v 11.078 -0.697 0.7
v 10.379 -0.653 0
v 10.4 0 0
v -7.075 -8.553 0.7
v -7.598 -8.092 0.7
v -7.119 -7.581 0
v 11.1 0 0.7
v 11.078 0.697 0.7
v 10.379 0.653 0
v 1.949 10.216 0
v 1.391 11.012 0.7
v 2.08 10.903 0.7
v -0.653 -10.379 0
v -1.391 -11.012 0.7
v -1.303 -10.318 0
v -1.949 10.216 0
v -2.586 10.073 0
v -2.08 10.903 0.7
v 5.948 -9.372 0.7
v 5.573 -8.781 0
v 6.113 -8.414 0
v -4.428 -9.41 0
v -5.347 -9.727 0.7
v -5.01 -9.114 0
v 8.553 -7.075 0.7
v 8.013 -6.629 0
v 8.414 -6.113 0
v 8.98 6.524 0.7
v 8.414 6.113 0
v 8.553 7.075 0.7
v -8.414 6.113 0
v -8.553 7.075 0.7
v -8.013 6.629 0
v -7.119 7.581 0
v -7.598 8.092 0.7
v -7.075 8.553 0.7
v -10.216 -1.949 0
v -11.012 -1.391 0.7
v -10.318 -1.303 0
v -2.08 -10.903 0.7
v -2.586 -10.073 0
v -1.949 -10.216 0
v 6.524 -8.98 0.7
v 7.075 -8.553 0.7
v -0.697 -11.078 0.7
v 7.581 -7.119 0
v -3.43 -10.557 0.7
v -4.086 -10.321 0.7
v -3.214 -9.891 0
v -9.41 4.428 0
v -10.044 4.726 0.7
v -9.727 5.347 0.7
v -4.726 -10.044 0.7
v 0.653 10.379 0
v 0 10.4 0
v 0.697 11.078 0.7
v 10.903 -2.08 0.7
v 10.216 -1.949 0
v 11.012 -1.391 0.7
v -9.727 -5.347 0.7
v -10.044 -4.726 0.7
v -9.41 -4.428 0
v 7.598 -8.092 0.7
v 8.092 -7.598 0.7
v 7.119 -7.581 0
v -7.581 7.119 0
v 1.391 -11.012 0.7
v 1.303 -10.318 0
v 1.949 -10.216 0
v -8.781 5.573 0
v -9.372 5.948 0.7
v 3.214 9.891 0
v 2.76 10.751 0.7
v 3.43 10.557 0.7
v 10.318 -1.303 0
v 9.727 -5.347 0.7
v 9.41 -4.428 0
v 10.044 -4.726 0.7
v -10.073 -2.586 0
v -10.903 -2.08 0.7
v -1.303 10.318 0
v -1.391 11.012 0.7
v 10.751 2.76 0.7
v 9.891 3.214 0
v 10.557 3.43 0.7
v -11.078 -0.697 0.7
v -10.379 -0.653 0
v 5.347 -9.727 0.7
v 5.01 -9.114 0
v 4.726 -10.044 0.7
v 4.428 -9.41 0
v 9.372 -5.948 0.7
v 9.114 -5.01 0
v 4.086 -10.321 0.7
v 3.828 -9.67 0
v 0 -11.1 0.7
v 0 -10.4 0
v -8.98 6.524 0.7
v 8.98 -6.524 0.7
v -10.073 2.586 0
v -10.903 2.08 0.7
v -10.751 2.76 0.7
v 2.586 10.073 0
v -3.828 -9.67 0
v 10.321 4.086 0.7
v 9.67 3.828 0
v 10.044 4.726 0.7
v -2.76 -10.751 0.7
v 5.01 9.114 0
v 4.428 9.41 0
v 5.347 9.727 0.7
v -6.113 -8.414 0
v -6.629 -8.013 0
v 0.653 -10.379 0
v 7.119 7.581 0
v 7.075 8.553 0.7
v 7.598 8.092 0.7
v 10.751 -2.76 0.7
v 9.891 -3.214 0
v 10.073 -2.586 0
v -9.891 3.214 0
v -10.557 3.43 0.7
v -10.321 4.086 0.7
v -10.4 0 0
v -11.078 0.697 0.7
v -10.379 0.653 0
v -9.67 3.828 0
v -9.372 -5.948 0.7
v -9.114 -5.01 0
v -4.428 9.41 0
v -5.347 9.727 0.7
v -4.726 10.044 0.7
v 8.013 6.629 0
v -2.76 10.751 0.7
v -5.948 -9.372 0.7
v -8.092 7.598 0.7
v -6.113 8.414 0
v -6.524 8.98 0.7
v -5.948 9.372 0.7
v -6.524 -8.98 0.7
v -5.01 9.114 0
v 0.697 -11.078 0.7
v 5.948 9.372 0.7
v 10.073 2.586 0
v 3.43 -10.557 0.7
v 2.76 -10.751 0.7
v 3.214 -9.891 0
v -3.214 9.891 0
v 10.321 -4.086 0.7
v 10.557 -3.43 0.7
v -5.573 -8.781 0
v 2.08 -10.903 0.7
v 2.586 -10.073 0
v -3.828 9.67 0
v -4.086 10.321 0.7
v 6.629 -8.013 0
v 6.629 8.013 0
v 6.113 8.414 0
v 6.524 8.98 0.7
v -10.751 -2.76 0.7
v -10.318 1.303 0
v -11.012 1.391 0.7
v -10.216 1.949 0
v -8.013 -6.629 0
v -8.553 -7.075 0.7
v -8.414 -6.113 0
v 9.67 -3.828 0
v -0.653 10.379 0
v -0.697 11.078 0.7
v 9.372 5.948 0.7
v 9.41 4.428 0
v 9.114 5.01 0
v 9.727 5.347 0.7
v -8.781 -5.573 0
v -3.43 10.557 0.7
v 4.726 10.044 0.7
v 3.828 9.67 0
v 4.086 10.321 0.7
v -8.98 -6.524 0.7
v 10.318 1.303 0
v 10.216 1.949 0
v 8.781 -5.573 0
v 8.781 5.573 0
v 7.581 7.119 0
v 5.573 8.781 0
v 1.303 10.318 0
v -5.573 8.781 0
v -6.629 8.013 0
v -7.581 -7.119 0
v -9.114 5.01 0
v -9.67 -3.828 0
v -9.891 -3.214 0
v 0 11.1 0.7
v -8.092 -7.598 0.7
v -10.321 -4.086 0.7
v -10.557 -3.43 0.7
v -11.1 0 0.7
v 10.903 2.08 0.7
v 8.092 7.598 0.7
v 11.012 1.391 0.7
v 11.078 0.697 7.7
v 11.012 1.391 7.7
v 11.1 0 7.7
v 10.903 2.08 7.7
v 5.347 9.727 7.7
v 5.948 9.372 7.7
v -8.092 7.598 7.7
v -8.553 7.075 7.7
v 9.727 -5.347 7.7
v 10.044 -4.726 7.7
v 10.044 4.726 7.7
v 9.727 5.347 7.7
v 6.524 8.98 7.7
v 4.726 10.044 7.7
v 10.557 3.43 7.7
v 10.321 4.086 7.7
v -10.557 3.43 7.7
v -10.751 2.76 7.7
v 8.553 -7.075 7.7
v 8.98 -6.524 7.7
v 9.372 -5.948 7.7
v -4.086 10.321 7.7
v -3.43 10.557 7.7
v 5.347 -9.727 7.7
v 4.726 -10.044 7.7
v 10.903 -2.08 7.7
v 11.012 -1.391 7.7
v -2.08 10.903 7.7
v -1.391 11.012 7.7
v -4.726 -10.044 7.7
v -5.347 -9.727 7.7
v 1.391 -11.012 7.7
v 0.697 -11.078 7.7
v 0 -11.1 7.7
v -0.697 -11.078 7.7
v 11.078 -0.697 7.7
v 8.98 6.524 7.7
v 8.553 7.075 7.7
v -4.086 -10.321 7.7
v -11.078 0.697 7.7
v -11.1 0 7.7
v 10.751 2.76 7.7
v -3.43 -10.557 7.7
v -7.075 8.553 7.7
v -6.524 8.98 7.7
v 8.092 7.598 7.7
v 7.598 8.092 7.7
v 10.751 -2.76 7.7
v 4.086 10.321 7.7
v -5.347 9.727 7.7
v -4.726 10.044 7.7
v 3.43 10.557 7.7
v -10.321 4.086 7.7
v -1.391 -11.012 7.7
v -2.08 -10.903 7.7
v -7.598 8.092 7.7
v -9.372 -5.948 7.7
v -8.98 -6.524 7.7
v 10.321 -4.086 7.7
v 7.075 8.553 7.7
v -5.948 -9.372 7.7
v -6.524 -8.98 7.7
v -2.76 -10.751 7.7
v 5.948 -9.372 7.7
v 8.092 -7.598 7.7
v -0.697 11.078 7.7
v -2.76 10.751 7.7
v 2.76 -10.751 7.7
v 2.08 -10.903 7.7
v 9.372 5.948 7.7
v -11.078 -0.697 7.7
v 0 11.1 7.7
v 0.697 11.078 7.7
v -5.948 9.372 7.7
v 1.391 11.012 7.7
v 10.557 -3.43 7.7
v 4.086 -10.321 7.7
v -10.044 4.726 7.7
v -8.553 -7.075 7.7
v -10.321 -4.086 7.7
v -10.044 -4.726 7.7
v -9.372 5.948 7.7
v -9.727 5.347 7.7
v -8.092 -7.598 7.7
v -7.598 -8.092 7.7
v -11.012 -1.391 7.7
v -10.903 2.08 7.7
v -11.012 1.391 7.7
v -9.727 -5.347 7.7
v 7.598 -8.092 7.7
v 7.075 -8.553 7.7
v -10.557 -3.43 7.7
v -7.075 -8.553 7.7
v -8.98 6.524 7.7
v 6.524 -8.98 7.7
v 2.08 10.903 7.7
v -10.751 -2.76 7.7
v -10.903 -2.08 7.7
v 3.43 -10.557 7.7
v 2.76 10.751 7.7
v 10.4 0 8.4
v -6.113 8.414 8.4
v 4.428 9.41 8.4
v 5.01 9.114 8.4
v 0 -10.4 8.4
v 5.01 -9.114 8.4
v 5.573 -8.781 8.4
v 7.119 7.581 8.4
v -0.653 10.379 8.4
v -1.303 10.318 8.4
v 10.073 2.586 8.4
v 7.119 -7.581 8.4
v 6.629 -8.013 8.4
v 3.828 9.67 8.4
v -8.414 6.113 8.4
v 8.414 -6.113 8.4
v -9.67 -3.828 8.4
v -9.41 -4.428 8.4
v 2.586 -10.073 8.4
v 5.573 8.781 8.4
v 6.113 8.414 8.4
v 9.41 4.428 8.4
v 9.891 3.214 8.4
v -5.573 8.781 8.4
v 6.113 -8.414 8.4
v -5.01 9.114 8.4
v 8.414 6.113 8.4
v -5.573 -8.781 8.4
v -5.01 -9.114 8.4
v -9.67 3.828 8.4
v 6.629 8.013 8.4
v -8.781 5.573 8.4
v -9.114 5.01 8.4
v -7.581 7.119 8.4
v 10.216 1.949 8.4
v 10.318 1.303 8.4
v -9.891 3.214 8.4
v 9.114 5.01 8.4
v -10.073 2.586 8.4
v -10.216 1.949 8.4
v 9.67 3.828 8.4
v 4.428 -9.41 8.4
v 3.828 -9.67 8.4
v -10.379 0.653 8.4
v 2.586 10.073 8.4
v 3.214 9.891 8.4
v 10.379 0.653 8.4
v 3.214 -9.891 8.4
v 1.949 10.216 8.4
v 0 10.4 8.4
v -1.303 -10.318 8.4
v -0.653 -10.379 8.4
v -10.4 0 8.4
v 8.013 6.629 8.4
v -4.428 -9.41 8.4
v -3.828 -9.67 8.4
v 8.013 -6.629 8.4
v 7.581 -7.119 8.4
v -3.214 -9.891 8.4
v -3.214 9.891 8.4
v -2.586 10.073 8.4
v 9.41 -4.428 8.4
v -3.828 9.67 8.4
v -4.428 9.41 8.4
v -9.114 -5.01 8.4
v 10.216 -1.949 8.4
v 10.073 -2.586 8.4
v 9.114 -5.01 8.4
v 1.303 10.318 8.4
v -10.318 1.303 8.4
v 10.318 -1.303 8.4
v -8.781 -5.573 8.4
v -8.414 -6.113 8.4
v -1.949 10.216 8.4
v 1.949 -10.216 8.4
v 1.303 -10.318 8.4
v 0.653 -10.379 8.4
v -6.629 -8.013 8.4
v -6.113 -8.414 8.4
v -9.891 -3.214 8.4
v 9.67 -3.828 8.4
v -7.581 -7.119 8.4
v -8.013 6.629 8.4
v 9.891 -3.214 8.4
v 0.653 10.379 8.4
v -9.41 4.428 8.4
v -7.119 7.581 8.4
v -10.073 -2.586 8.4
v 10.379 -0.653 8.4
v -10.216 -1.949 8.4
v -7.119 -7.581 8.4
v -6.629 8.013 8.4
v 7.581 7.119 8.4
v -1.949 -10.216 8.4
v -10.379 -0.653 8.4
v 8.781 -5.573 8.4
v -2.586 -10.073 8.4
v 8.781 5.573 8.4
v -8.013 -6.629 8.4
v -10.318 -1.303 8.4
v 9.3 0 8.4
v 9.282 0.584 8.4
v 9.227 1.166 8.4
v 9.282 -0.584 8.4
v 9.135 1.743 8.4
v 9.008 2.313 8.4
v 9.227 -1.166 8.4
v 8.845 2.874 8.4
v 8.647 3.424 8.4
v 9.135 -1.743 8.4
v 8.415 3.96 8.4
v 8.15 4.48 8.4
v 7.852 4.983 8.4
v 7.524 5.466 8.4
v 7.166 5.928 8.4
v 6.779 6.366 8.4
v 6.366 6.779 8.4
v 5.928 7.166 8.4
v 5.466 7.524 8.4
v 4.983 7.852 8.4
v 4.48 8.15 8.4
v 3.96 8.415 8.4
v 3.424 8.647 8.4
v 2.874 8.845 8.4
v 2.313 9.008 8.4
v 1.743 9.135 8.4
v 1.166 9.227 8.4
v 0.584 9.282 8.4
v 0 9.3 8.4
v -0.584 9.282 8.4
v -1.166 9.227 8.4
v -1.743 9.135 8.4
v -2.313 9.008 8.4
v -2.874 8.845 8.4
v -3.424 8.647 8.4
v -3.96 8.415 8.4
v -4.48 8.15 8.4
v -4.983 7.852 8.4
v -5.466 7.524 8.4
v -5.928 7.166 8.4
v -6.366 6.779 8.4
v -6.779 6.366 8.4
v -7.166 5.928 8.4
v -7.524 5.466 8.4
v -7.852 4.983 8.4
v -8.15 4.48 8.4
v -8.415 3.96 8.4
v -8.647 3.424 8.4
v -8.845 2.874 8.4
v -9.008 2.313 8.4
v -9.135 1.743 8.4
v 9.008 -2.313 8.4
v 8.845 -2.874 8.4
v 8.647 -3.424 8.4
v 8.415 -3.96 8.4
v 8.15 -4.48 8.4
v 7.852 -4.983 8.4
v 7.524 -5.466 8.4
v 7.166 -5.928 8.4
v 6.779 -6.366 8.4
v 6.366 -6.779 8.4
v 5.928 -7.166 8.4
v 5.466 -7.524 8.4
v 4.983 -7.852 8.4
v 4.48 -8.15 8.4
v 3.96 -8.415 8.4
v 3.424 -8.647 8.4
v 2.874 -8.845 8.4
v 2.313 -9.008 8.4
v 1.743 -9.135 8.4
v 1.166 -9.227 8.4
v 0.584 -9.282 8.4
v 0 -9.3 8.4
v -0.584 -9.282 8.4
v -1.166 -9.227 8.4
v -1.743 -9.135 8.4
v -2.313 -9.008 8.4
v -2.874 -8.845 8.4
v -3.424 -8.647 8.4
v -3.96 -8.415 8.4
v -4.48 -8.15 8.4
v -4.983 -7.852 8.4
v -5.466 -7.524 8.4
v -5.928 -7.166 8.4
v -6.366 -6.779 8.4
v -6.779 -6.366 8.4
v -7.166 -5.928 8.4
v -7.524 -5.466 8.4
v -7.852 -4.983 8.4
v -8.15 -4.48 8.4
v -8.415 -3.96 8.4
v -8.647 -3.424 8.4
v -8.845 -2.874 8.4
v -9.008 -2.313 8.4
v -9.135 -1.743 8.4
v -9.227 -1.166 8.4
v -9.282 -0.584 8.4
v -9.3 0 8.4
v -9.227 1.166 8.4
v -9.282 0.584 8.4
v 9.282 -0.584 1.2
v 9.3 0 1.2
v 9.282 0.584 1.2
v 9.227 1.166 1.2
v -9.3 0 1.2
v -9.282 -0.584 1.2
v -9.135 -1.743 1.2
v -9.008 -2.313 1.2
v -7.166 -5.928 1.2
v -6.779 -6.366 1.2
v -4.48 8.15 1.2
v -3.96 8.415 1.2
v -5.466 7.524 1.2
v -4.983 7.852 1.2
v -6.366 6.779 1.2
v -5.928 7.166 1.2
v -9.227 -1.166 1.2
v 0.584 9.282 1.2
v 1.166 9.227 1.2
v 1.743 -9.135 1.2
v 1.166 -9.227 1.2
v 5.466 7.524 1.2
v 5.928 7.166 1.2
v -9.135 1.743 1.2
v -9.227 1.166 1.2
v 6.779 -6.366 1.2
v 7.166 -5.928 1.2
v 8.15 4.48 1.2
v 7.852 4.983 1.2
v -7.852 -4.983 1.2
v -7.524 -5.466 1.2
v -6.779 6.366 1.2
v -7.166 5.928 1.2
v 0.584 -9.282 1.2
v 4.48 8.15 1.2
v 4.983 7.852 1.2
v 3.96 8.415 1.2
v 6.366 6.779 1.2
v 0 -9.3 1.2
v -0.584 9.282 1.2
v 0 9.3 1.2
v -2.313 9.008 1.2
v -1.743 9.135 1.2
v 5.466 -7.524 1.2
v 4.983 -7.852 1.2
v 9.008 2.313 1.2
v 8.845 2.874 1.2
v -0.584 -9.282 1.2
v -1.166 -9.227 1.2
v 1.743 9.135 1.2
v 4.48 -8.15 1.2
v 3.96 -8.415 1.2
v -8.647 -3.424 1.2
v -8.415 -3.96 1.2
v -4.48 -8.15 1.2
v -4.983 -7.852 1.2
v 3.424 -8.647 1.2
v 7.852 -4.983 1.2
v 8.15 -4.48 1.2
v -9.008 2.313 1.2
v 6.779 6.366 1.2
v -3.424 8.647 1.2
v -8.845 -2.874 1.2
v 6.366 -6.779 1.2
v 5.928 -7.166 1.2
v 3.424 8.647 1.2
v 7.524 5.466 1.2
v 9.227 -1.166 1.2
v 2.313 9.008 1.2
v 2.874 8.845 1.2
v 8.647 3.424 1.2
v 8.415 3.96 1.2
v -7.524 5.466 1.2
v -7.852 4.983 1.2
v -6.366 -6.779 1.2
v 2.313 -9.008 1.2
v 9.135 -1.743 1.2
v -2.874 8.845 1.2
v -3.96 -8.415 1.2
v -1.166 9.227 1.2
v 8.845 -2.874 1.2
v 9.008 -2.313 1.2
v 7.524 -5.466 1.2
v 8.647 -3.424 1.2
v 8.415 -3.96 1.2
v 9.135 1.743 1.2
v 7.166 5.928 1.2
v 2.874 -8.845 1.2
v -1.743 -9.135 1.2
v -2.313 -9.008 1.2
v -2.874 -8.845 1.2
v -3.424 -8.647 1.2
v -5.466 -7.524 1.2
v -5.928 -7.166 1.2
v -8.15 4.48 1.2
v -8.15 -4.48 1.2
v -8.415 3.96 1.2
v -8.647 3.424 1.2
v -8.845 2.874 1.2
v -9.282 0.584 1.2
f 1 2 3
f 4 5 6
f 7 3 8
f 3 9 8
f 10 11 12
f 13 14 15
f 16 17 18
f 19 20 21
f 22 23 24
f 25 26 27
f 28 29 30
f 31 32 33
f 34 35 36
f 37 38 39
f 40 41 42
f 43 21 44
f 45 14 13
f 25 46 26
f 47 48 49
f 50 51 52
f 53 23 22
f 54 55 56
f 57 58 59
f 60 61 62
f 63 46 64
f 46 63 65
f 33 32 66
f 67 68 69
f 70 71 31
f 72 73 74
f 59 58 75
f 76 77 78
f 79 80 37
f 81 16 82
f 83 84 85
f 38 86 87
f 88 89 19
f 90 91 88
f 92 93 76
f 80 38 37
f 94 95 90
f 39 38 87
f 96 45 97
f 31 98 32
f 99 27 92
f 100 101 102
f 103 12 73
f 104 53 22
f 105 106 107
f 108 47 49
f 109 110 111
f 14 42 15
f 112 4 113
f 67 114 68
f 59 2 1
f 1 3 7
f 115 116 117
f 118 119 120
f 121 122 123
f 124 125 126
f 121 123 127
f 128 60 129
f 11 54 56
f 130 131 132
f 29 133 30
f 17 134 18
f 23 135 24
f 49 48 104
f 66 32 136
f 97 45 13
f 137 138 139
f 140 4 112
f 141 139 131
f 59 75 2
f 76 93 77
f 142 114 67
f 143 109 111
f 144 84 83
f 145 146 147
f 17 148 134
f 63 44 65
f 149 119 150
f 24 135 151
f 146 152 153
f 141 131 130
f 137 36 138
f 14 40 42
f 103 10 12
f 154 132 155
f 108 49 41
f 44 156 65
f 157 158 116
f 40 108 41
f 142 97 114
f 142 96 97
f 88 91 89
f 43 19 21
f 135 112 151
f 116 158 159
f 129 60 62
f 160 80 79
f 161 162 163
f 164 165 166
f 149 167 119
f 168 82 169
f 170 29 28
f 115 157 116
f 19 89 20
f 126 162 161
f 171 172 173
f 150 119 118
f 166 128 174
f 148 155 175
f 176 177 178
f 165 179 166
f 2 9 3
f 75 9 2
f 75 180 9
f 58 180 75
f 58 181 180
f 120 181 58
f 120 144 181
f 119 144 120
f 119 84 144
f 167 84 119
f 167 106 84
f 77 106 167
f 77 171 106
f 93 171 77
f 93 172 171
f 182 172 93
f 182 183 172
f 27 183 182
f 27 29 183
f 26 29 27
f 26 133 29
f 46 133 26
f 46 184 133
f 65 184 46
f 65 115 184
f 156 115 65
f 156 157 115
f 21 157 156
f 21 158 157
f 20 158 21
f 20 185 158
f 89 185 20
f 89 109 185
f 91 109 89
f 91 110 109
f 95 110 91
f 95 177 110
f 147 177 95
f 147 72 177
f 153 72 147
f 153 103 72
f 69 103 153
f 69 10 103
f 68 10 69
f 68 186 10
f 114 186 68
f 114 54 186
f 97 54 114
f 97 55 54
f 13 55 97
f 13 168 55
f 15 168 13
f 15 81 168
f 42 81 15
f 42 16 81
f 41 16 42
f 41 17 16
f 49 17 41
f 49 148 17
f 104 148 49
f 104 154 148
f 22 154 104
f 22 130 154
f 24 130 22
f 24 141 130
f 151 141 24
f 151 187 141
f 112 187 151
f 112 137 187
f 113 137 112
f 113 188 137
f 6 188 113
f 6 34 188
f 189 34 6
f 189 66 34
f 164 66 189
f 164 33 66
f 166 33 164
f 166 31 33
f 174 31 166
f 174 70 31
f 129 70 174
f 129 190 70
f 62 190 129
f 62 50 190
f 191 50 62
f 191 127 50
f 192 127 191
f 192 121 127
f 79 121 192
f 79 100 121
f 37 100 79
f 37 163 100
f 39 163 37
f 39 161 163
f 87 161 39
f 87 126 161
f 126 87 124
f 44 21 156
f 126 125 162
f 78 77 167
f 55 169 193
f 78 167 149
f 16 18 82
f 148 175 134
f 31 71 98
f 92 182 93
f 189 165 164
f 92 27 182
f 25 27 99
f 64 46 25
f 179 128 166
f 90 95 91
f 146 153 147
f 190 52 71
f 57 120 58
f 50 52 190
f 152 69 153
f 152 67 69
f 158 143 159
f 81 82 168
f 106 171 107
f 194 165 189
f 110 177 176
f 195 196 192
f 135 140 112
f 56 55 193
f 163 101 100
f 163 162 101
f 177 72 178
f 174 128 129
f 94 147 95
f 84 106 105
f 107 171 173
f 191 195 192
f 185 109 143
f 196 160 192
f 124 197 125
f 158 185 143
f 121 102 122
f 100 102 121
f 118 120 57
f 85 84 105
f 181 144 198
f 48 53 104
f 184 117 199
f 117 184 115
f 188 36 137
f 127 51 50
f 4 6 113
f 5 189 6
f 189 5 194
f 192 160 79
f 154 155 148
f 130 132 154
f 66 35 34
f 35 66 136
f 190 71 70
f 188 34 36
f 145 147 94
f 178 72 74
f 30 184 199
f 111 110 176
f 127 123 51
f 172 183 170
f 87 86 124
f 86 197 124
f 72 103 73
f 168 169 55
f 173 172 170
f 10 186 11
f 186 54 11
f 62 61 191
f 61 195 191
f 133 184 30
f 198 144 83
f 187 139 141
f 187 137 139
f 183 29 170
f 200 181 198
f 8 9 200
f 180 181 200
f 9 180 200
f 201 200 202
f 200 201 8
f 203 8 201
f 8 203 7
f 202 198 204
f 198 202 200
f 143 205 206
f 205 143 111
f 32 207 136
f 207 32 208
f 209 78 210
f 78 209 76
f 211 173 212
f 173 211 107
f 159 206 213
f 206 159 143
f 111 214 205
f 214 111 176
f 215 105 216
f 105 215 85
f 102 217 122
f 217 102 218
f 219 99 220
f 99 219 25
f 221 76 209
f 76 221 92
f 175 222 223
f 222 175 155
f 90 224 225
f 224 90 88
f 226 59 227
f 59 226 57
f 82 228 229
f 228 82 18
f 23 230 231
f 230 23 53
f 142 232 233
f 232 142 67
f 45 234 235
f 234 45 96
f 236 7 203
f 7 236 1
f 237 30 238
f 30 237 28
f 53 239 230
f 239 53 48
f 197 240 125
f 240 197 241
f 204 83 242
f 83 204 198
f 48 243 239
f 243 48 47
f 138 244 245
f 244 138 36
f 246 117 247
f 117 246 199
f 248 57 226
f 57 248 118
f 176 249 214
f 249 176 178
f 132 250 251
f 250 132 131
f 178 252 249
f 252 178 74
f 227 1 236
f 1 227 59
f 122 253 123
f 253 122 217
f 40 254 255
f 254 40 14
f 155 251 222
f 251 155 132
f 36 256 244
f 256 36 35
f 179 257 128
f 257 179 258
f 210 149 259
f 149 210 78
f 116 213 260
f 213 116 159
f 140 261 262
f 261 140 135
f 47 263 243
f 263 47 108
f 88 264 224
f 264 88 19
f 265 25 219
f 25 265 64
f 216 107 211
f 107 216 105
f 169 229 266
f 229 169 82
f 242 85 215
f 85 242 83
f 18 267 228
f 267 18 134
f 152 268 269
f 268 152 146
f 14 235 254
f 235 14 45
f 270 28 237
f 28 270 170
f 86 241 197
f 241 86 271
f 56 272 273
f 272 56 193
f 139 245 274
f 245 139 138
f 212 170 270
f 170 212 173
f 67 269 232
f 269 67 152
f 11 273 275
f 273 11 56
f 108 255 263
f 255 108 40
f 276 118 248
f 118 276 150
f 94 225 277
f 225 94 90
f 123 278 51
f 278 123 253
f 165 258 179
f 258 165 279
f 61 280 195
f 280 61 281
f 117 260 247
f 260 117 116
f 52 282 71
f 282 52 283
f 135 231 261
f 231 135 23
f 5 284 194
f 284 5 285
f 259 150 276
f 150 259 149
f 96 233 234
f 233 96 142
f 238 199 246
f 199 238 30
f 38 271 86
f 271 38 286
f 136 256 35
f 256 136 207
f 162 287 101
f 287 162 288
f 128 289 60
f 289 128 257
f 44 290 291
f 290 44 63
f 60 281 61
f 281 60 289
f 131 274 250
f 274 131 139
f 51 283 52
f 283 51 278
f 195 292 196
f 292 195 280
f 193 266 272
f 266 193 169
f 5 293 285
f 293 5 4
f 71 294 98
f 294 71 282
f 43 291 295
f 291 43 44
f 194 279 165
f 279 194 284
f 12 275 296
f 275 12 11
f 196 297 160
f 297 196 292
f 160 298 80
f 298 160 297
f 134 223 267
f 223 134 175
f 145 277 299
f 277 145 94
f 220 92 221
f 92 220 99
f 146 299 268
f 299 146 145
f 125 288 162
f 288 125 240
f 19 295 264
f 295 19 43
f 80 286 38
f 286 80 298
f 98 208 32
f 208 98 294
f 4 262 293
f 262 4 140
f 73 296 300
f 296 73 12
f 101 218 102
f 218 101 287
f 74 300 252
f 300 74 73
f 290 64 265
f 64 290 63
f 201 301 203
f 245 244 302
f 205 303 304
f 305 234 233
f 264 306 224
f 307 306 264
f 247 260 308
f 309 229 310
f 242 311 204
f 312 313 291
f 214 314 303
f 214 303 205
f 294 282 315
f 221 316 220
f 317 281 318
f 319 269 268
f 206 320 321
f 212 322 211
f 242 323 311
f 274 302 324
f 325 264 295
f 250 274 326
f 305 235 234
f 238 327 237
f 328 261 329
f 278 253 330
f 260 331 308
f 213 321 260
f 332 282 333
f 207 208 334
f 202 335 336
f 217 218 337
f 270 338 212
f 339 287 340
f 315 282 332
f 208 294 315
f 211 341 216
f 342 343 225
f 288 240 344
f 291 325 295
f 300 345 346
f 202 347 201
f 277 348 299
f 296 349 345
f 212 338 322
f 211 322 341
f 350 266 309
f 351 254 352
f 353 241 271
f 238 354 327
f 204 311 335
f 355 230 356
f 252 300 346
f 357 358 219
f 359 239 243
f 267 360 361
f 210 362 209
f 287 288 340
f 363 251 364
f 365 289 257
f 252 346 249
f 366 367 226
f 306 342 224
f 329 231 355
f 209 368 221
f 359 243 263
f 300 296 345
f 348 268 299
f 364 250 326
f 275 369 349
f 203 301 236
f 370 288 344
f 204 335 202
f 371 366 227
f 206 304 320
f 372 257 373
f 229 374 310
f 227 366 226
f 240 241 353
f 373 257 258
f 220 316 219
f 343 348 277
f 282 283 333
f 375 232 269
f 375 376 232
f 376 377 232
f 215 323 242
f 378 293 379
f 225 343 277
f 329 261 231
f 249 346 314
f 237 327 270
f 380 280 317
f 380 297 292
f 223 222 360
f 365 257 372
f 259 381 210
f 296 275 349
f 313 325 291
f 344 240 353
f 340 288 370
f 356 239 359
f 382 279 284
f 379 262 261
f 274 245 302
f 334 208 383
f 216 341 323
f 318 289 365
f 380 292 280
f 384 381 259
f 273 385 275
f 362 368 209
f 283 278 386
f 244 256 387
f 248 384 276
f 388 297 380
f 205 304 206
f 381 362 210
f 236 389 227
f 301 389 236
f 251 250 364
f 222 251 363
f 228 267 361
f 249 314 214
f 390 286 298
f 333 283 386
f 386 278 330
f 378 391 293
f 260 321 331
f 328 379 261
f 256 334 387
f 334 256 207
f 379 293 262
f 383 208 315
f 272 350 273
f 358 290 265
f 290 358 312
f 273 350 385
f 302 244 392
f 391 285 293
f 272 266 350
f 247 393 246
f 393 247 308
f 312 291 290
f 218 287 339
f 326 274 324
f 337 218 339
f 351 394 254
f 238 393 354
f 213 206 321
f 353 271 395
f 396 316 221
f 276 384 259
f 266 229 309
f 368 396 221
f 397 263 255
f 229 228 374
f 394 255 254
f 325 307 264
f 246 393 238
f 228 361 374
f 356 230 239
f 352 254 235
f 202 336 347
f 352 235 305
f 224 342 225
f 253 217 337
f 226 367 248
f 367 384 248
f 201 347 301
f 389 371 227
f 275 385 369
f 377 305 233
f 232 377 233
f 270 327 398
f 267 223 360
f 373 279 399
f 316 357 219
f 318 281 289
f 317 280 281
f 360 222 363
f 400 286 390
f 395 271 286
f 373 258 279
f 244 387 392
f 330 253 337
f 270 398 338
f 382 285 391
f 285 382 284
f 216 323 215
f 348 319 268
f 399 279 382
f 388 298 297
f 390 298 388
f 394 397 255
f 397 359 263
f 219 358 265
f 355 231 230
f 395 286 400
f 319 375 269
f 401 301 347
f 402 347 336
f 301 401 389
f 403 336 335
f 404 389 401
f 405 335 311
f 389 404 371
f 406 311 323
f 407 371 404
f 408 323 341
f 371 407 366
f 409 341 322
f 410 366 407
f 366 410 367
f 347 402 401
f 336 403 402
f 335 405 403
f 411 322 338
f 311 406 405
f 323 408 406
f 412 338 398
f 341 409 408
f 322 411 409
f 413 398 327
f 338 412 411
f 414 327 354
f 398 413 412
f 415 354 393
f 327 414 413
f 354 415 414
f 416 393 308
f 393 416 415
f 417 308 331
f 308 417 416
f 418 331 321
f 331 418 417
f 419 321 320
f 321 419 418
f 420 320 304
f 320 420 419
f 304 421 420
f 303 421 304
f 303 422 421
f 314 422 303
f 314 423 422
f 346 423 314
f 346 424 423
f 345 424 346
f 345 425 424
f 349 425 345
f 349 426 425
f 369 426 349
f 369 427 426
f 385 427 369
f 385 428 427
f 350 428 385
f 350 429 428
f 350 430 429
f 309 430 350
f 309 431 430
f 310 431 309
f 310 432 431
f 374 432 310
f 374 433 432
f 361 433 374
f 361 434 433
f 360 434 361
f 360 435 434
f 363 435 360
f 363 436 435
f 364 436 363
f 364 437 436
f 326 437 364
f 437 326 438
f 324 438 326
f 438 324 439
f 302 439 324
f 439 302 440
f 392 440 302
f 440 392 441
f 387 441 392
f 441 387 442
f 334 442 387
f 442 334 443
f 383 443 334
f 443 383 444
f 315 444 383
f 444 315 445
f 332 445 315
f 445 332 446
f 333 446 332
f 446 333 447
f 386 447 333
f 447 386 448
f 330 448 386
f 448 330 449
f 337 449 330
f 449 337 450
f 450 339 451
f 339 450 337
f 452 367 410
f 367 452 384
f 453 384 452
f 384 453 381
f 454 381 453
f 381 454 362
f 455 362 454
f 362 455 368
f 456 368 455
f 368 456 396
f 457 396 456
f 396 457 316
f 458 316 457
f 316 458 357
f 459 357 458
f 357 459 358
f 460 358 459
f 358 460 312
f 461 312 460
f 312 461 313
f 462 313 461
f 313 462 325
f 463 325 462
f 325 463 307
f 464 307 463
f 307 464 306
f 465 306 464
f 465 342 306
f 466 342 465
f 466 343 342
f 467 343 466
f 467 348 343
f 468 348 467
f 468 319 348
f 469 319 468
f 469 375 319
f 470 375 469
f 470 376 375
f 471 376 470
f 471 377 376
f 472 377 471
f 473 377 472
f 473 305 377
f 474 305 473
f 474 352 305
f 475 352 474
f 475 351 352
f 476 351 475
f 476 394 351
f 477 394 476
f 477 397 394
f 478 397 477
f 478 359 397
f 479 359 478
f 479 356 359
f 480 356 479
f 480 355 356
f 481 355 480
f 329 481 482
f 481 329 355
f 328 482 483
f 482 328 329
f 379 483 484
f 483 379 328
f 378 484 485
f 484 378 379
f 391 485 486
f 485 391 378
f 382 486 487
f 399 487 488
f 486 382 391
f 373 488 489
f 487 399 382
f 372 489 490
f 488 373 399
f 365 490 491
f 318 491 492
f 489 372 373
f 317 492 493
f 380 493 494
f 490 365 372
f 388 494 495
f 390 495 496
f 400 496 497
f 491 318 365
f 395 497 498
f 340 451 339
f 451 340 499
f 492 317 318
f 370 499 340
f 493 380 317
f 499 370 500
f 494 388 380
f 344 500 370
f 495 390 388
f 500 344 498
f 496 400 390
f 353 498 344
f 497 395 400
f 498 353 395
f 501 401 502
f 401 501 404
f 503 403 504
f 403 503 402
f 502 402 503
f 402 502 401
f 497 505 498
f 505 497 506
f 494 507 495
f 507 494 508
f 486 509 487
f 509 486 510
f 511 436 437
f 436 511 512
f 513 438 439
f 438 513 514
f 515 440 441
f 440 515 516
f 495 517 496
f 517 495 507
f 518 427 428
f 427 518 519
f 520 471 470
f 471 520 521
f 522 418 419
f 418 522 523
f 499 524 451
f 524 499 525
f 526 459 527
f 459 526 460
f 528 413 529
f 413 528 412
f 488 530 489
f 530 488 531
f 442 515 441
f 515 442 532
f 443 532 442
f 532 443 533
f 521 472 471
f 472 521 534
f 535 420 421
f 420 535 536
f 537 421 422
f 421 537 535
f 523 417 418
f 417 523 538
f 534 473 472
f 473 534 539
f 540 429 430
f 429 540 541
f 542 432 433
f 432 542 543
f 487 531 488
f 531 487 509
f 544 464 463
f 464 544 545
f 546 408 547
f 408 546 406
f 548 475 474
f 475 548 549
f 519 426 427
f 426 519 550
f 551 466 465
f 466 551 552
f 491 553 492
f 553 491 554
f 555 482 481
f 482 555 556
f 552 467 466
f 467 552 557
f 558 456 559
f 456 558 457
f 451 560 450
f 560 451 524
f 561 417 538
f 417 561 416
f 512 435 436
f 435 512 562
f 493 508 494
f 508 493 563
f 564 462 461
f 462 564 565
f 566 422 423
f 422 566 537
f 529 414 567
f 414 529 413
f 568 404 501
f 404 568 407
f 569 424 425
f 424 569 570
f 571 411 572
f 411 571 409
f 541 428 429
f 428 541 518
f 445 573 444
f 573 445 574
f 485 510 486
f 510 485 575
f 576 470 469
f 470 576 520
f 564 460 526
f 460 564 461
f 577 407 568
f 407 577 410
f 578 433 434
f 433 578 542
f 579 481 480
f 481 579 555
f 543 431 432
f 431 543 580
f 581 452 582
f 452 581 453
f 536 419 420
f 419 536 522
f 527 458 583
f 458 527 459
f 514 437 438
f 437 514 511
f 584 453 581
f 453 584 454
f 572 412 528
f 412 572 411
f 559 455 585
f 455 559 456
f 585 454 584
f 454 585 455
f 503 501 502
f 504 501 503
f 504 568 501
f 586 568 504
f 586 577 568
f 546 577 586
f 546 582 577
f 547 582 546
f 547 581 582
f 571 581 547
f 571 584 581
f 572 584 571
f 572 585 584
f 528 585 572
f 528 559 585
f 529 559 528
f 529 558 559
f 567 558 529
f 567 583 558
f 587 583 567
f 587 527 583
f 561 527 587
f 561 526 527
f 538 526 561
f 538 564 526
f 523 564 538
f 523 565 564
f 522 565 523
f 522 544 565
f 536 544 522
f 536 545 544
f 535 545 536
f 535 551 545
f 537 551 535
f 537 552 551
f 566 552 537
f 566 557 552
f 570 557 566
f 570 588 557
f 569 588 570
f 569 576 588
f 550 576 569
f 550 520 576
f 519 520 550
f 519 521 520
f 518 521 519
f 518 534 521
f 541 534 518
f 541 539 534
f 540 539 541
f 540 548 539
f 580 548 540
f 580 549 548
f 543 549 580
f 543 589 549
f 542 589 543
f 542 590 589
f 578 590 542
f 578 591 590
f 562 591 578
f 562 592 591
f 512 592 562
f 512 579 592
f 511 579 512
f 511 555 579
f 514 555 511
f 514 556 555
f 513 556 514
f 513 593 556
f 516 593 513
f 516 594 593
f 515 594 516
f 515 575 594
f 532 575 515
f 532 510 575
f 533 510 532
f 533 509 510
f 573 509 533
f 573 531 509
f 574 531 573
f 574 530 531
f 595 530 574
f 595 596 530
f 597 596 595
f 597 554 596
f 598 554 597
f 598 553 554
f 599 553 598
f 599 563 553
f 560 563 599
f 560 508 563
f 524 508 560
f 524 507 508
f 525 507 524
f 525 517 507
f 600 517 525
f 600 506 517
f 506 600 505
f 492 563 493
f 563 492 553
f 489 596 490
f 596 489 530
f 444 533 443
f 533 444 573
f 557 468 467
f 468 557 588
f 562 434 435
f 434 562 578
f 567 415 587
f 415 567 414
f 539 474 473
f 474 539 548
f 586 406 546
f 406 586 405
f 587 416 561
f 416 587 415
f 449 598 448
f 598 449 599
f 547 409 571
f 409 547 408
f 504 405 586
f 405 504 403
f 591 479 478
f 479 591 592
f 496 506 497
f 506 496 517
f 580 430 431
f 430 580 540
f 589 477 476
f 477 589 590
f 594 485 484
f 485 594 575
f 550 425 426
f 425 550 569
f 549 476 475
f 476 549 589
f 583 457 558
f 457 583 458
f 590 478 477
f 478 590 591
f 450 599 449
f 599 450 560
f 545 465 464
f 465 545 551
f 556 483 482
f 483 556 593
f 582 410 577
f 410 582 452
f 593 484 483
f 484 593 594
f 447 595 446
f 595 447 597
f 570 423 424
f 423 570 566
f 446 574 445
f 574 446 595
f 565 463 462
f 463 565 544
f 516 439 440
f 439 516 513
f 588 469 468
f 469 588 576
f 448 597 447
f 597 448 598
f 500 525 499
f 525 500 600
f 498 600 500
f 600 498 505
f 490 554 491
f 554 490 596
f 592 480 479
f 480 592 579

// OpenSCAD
//
//  dust cap for bearing
//  design by egil kvaleberg, 4 april 2015
//

// select for press fit, default is for 608-ZZ bearing, nominally 22mm dia
maindia = 22.20; 

// height of rim, based on how much space is available axially
rimheight = 8.4;

// wall thickness of dust cap 
wall = 1.2; 

// rim width
rim = 1.8; 

ridge = min(0.7, rimheight/4);

difference() {
	union() {
		cylinder(r1 = maindia/2-ridge, r2 = maindia/2, h = ridge, $fn=100); 
		translate([0, 0, ridge]) cylinder(r = maindia/2, h = rimheight - 2*ridge, $fn=100); 
		translate([0, 0, rimheight-ridge]) cylinder(r2 = maindia/2-ridge, r1 = maindia/2, h = ridge, $fn=100); 
	}
	translate([0, 0, wall]) cylinder(r = maindia/2-rim, h = rimheight, $fn=100); 
}
